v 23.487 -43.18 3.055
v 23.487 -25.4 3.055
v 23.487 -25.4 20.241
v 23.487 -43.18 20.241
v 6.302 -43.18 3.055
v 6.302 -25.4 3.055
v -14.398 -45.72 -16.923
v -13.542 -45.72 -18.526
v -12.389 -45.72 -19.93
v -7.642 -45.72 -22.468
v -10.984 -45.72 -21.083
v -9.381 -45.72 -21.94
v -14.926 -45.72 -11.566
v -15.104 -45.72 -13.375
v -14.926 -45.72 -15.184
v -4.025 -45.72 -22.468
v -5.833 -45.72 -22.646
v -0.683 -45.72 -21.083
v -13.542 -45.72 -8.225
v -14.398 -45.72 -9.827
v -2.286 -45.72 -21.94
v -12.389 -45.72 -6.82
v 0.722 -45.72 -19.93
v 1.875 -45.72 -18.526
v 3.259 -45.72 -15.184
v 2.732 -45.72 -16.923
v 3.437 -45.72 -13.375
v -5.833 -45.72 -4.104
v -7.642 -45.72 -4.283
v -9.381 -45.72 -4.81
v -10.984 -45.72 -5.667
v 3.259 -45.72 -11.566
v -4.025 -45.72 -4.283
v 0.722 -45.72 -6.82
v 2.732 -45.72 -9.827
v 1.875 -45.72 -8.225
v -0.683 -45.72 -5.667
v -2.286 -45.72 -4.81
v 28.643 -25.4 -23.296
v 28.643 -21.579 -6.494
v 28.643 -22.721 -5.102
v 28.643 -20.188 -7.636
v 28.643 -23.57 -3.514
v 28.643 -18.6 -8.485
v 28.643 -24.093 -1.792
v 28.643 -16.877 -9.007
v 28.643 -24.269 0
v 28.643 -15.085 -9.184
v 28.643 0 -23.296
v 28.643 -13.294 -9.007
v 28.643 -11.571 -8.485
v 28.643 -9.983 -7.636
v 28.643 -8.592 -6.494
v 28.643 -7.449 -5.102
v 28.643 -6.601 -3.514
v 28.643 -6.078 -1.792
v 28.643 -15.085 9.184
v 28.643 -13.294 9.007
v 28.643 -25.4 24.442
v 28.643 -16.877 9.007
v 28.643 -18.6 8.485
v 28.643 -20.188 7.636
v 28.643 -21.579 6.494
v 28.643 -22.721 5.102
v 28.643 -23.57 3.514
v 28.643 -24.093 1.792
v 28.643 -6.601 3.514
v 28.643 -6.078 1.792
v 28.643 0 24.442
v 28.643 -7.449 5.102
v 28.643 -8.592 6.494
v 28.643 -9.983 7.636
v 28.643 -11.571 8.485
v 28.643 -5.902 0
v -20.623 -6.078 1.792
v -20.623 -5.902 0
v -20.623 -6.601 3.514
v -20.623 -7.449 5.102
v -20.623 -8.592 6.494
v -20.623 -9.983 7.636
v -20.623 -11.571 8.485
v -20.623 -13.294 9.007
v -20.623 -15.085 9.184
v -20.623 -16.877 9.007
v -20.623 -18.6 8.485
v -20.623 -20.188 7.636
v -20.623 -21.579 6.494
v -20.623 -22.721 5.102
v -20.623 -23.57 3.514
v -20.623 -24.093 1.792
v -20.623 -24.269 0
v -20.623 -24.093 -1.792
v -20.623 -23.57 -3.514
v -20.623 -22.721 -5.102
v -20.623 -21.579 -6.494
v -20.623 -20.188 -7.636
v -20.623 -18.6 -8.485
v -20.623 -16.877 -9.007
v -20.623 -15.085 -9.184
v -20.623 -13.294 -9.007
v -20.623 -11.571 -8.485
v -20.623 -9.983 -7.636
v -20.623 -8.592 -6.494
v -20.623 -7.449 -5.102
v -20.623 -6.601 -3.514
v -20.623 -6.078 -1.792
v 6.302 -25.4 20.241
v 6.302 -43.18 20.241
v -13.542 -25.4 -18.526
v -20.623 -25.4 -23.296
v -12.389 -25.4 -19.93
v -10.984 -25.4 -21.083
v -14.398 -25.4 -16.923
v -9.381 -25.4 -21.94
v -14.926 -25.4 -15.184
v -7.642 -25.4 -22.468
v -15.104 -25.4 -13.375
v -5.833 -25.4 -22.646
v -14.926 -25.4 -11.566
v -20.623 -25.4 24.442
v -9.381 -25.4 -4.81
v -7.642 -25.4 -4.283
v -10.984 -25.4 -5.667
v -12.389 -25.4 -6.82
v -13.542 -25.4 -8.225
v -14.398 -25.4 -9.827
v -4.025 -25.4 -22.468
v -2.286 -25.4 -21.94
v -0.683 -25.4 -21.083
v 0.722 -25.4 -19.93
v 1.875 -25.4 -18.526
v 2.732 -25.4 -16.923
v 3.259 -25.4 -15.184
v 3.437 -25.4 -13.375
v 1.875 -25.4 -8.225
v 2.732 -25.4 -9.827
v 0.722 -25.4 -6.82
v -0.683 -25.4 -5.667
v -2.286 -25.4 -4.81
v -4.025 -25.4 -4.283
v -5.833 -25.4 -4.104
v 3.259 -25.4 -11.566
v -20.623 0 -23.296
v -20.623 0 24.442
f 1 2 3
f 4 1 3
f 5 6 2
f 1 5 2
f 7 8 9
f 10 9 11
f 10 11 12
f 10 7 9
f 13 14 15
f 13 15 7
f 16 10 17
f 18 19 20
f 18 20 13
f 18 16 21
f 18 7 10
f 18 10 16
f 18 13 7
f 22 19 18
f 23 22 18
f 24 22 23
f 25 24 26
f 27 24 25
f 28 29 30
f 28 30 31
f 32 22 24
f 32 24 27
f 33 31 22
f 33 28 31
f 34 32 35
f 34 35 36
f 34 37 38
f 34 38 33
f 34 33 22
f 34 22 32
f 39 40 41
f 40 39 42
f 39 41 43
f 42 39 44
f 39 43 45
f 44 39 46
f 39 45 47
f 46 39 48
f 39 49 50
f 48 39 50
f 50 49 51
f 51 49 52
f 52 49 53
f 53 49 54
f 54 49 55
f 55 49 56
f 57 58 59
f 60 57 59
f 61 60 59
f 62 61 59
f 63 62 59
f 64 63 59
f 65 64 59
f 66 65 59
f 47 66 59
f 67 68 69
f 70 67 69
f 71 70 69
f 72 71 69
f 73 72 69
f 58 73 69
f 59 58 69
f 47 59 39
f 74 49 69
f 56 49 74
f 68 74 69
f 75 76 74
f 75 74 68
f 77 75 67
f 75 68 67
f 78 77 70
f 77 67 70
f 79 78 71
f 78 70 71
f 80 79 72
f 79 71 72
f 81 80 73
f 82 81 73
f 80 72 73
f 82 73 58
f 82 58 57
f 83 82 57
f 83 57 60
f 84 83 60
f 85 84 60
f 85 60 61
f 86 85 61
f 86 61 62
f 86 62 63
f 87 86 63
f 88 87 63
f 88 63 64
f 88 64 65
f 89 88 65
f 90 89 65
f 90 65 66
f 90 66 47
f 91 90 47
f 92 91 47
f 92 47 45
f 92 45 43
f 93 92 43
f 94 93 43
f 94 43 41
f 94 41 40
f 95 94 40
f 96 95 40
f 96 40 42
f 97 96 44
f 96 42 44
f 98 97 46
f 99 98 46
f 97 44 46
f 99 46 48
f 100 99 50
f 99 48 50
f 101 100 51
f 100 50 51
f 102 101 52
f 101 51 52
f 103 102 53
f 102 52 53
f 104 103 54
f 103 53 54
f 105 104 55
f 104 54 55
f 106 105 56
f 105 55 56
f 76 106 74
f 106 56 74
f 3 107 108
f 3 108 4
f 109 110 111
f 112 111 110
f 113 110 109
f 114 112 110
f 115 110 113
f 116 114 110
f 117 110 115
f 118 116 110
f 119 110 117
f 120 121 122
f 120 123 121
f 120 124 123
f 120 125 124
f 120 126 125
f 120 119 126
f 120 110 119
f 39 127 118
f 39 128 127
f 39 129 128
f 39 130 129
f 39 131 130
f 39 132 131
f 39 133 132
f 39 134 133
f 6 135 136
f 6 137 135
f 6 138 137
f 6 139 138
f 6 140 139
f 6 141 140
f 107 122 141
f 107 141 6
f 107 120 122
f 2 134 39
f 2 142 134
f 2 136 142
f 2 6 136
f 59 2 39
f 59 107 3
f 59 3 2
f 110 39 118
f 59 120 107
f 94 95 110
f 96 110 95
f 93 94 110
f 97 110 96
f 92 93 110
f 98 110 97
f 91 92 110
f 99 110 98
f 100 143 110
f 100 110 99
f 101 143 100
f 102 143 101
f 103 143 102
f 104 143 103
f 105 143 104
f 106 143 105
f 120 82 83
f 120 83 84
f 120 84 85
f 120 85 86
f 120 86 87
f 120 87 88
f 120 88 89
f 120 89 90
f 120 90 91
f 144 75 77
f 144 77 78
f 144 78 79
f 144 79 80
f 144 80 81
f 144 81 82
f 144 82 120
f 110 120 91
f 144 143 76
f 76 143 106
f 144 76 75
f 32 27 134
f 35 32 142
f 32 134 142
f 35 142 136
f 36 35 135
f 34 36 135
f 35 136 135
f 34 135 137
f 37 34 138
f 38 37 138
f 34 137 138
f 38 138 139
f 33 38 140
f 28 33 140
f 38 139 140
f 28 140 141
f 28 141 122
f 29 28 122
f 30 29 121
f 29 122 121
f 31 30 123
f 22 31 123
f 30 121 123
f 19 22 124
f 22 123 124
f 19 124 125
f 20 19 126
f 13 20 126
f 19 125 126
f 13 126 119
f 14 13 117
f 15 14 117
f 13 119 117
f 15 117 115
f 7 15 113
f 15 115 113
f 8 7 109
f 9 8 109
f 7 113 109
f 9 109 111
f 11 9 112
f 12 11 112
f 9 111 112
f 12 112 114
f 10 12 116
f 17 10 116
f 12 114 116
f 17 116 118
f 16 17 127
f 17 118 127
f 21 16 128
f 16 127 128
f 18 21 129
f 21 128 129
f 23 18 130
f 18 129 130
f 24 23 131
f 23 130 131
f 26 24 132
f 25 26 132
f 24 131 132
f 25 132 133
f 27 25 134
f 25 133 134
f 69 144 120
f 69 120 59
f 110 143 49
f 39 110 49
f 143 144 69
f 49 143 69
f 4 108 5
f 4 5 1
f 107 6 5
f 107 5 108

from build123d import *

# Parameters (mm, degrees)
F0_W     = 49.266301
F0_H     = 47.738668
F1_DEPTH = 25.4
F2_W     = 17.185921
F2_H     = 17.185918
F3_DEPTH = 17.78
F4_R     = 9.270667
F5_DEPTH = 20.32
F6_R     = 9.183708
F7_DEPTH = 50.8


with BuildPart() as f1:
    # F0 (on Front) → F1 (new body)
    with BuildSketch(Plane.XZ):
        with Locations((4.010047, 0.572864)):
            Rectangle(F0_W, F0_H)
    extrude(amount=F1_DEPTH)

    # F2 (on face) → F3 (join)
    with BuildSketch(Plane.XZ.offset(25.4)):
        with Locations((14.894463, 11.648234)):
            Rectangle(F2_W, F2_H)
    extrude(amount=F3_DEPTH)

    # F4 (on face) → F5 (join)
    with BuildSketch(Plane.XZ.offset(25.4)):
        with Locations((-5.833408, -13.375082)):
            Circle(F4_R)
    extrude(amount=F5_DEPTH)

    # F6 (on face) → F7 (cut)
    with BuildSketch(Plane.YZ.offset(28.643198)):
        with Locations((-15.085418, 0)):
            Circle(F6_R)
    extrude(amount=-F7_DEPTH, mode=Mode.SUBTRACT)


solid = f1.part
